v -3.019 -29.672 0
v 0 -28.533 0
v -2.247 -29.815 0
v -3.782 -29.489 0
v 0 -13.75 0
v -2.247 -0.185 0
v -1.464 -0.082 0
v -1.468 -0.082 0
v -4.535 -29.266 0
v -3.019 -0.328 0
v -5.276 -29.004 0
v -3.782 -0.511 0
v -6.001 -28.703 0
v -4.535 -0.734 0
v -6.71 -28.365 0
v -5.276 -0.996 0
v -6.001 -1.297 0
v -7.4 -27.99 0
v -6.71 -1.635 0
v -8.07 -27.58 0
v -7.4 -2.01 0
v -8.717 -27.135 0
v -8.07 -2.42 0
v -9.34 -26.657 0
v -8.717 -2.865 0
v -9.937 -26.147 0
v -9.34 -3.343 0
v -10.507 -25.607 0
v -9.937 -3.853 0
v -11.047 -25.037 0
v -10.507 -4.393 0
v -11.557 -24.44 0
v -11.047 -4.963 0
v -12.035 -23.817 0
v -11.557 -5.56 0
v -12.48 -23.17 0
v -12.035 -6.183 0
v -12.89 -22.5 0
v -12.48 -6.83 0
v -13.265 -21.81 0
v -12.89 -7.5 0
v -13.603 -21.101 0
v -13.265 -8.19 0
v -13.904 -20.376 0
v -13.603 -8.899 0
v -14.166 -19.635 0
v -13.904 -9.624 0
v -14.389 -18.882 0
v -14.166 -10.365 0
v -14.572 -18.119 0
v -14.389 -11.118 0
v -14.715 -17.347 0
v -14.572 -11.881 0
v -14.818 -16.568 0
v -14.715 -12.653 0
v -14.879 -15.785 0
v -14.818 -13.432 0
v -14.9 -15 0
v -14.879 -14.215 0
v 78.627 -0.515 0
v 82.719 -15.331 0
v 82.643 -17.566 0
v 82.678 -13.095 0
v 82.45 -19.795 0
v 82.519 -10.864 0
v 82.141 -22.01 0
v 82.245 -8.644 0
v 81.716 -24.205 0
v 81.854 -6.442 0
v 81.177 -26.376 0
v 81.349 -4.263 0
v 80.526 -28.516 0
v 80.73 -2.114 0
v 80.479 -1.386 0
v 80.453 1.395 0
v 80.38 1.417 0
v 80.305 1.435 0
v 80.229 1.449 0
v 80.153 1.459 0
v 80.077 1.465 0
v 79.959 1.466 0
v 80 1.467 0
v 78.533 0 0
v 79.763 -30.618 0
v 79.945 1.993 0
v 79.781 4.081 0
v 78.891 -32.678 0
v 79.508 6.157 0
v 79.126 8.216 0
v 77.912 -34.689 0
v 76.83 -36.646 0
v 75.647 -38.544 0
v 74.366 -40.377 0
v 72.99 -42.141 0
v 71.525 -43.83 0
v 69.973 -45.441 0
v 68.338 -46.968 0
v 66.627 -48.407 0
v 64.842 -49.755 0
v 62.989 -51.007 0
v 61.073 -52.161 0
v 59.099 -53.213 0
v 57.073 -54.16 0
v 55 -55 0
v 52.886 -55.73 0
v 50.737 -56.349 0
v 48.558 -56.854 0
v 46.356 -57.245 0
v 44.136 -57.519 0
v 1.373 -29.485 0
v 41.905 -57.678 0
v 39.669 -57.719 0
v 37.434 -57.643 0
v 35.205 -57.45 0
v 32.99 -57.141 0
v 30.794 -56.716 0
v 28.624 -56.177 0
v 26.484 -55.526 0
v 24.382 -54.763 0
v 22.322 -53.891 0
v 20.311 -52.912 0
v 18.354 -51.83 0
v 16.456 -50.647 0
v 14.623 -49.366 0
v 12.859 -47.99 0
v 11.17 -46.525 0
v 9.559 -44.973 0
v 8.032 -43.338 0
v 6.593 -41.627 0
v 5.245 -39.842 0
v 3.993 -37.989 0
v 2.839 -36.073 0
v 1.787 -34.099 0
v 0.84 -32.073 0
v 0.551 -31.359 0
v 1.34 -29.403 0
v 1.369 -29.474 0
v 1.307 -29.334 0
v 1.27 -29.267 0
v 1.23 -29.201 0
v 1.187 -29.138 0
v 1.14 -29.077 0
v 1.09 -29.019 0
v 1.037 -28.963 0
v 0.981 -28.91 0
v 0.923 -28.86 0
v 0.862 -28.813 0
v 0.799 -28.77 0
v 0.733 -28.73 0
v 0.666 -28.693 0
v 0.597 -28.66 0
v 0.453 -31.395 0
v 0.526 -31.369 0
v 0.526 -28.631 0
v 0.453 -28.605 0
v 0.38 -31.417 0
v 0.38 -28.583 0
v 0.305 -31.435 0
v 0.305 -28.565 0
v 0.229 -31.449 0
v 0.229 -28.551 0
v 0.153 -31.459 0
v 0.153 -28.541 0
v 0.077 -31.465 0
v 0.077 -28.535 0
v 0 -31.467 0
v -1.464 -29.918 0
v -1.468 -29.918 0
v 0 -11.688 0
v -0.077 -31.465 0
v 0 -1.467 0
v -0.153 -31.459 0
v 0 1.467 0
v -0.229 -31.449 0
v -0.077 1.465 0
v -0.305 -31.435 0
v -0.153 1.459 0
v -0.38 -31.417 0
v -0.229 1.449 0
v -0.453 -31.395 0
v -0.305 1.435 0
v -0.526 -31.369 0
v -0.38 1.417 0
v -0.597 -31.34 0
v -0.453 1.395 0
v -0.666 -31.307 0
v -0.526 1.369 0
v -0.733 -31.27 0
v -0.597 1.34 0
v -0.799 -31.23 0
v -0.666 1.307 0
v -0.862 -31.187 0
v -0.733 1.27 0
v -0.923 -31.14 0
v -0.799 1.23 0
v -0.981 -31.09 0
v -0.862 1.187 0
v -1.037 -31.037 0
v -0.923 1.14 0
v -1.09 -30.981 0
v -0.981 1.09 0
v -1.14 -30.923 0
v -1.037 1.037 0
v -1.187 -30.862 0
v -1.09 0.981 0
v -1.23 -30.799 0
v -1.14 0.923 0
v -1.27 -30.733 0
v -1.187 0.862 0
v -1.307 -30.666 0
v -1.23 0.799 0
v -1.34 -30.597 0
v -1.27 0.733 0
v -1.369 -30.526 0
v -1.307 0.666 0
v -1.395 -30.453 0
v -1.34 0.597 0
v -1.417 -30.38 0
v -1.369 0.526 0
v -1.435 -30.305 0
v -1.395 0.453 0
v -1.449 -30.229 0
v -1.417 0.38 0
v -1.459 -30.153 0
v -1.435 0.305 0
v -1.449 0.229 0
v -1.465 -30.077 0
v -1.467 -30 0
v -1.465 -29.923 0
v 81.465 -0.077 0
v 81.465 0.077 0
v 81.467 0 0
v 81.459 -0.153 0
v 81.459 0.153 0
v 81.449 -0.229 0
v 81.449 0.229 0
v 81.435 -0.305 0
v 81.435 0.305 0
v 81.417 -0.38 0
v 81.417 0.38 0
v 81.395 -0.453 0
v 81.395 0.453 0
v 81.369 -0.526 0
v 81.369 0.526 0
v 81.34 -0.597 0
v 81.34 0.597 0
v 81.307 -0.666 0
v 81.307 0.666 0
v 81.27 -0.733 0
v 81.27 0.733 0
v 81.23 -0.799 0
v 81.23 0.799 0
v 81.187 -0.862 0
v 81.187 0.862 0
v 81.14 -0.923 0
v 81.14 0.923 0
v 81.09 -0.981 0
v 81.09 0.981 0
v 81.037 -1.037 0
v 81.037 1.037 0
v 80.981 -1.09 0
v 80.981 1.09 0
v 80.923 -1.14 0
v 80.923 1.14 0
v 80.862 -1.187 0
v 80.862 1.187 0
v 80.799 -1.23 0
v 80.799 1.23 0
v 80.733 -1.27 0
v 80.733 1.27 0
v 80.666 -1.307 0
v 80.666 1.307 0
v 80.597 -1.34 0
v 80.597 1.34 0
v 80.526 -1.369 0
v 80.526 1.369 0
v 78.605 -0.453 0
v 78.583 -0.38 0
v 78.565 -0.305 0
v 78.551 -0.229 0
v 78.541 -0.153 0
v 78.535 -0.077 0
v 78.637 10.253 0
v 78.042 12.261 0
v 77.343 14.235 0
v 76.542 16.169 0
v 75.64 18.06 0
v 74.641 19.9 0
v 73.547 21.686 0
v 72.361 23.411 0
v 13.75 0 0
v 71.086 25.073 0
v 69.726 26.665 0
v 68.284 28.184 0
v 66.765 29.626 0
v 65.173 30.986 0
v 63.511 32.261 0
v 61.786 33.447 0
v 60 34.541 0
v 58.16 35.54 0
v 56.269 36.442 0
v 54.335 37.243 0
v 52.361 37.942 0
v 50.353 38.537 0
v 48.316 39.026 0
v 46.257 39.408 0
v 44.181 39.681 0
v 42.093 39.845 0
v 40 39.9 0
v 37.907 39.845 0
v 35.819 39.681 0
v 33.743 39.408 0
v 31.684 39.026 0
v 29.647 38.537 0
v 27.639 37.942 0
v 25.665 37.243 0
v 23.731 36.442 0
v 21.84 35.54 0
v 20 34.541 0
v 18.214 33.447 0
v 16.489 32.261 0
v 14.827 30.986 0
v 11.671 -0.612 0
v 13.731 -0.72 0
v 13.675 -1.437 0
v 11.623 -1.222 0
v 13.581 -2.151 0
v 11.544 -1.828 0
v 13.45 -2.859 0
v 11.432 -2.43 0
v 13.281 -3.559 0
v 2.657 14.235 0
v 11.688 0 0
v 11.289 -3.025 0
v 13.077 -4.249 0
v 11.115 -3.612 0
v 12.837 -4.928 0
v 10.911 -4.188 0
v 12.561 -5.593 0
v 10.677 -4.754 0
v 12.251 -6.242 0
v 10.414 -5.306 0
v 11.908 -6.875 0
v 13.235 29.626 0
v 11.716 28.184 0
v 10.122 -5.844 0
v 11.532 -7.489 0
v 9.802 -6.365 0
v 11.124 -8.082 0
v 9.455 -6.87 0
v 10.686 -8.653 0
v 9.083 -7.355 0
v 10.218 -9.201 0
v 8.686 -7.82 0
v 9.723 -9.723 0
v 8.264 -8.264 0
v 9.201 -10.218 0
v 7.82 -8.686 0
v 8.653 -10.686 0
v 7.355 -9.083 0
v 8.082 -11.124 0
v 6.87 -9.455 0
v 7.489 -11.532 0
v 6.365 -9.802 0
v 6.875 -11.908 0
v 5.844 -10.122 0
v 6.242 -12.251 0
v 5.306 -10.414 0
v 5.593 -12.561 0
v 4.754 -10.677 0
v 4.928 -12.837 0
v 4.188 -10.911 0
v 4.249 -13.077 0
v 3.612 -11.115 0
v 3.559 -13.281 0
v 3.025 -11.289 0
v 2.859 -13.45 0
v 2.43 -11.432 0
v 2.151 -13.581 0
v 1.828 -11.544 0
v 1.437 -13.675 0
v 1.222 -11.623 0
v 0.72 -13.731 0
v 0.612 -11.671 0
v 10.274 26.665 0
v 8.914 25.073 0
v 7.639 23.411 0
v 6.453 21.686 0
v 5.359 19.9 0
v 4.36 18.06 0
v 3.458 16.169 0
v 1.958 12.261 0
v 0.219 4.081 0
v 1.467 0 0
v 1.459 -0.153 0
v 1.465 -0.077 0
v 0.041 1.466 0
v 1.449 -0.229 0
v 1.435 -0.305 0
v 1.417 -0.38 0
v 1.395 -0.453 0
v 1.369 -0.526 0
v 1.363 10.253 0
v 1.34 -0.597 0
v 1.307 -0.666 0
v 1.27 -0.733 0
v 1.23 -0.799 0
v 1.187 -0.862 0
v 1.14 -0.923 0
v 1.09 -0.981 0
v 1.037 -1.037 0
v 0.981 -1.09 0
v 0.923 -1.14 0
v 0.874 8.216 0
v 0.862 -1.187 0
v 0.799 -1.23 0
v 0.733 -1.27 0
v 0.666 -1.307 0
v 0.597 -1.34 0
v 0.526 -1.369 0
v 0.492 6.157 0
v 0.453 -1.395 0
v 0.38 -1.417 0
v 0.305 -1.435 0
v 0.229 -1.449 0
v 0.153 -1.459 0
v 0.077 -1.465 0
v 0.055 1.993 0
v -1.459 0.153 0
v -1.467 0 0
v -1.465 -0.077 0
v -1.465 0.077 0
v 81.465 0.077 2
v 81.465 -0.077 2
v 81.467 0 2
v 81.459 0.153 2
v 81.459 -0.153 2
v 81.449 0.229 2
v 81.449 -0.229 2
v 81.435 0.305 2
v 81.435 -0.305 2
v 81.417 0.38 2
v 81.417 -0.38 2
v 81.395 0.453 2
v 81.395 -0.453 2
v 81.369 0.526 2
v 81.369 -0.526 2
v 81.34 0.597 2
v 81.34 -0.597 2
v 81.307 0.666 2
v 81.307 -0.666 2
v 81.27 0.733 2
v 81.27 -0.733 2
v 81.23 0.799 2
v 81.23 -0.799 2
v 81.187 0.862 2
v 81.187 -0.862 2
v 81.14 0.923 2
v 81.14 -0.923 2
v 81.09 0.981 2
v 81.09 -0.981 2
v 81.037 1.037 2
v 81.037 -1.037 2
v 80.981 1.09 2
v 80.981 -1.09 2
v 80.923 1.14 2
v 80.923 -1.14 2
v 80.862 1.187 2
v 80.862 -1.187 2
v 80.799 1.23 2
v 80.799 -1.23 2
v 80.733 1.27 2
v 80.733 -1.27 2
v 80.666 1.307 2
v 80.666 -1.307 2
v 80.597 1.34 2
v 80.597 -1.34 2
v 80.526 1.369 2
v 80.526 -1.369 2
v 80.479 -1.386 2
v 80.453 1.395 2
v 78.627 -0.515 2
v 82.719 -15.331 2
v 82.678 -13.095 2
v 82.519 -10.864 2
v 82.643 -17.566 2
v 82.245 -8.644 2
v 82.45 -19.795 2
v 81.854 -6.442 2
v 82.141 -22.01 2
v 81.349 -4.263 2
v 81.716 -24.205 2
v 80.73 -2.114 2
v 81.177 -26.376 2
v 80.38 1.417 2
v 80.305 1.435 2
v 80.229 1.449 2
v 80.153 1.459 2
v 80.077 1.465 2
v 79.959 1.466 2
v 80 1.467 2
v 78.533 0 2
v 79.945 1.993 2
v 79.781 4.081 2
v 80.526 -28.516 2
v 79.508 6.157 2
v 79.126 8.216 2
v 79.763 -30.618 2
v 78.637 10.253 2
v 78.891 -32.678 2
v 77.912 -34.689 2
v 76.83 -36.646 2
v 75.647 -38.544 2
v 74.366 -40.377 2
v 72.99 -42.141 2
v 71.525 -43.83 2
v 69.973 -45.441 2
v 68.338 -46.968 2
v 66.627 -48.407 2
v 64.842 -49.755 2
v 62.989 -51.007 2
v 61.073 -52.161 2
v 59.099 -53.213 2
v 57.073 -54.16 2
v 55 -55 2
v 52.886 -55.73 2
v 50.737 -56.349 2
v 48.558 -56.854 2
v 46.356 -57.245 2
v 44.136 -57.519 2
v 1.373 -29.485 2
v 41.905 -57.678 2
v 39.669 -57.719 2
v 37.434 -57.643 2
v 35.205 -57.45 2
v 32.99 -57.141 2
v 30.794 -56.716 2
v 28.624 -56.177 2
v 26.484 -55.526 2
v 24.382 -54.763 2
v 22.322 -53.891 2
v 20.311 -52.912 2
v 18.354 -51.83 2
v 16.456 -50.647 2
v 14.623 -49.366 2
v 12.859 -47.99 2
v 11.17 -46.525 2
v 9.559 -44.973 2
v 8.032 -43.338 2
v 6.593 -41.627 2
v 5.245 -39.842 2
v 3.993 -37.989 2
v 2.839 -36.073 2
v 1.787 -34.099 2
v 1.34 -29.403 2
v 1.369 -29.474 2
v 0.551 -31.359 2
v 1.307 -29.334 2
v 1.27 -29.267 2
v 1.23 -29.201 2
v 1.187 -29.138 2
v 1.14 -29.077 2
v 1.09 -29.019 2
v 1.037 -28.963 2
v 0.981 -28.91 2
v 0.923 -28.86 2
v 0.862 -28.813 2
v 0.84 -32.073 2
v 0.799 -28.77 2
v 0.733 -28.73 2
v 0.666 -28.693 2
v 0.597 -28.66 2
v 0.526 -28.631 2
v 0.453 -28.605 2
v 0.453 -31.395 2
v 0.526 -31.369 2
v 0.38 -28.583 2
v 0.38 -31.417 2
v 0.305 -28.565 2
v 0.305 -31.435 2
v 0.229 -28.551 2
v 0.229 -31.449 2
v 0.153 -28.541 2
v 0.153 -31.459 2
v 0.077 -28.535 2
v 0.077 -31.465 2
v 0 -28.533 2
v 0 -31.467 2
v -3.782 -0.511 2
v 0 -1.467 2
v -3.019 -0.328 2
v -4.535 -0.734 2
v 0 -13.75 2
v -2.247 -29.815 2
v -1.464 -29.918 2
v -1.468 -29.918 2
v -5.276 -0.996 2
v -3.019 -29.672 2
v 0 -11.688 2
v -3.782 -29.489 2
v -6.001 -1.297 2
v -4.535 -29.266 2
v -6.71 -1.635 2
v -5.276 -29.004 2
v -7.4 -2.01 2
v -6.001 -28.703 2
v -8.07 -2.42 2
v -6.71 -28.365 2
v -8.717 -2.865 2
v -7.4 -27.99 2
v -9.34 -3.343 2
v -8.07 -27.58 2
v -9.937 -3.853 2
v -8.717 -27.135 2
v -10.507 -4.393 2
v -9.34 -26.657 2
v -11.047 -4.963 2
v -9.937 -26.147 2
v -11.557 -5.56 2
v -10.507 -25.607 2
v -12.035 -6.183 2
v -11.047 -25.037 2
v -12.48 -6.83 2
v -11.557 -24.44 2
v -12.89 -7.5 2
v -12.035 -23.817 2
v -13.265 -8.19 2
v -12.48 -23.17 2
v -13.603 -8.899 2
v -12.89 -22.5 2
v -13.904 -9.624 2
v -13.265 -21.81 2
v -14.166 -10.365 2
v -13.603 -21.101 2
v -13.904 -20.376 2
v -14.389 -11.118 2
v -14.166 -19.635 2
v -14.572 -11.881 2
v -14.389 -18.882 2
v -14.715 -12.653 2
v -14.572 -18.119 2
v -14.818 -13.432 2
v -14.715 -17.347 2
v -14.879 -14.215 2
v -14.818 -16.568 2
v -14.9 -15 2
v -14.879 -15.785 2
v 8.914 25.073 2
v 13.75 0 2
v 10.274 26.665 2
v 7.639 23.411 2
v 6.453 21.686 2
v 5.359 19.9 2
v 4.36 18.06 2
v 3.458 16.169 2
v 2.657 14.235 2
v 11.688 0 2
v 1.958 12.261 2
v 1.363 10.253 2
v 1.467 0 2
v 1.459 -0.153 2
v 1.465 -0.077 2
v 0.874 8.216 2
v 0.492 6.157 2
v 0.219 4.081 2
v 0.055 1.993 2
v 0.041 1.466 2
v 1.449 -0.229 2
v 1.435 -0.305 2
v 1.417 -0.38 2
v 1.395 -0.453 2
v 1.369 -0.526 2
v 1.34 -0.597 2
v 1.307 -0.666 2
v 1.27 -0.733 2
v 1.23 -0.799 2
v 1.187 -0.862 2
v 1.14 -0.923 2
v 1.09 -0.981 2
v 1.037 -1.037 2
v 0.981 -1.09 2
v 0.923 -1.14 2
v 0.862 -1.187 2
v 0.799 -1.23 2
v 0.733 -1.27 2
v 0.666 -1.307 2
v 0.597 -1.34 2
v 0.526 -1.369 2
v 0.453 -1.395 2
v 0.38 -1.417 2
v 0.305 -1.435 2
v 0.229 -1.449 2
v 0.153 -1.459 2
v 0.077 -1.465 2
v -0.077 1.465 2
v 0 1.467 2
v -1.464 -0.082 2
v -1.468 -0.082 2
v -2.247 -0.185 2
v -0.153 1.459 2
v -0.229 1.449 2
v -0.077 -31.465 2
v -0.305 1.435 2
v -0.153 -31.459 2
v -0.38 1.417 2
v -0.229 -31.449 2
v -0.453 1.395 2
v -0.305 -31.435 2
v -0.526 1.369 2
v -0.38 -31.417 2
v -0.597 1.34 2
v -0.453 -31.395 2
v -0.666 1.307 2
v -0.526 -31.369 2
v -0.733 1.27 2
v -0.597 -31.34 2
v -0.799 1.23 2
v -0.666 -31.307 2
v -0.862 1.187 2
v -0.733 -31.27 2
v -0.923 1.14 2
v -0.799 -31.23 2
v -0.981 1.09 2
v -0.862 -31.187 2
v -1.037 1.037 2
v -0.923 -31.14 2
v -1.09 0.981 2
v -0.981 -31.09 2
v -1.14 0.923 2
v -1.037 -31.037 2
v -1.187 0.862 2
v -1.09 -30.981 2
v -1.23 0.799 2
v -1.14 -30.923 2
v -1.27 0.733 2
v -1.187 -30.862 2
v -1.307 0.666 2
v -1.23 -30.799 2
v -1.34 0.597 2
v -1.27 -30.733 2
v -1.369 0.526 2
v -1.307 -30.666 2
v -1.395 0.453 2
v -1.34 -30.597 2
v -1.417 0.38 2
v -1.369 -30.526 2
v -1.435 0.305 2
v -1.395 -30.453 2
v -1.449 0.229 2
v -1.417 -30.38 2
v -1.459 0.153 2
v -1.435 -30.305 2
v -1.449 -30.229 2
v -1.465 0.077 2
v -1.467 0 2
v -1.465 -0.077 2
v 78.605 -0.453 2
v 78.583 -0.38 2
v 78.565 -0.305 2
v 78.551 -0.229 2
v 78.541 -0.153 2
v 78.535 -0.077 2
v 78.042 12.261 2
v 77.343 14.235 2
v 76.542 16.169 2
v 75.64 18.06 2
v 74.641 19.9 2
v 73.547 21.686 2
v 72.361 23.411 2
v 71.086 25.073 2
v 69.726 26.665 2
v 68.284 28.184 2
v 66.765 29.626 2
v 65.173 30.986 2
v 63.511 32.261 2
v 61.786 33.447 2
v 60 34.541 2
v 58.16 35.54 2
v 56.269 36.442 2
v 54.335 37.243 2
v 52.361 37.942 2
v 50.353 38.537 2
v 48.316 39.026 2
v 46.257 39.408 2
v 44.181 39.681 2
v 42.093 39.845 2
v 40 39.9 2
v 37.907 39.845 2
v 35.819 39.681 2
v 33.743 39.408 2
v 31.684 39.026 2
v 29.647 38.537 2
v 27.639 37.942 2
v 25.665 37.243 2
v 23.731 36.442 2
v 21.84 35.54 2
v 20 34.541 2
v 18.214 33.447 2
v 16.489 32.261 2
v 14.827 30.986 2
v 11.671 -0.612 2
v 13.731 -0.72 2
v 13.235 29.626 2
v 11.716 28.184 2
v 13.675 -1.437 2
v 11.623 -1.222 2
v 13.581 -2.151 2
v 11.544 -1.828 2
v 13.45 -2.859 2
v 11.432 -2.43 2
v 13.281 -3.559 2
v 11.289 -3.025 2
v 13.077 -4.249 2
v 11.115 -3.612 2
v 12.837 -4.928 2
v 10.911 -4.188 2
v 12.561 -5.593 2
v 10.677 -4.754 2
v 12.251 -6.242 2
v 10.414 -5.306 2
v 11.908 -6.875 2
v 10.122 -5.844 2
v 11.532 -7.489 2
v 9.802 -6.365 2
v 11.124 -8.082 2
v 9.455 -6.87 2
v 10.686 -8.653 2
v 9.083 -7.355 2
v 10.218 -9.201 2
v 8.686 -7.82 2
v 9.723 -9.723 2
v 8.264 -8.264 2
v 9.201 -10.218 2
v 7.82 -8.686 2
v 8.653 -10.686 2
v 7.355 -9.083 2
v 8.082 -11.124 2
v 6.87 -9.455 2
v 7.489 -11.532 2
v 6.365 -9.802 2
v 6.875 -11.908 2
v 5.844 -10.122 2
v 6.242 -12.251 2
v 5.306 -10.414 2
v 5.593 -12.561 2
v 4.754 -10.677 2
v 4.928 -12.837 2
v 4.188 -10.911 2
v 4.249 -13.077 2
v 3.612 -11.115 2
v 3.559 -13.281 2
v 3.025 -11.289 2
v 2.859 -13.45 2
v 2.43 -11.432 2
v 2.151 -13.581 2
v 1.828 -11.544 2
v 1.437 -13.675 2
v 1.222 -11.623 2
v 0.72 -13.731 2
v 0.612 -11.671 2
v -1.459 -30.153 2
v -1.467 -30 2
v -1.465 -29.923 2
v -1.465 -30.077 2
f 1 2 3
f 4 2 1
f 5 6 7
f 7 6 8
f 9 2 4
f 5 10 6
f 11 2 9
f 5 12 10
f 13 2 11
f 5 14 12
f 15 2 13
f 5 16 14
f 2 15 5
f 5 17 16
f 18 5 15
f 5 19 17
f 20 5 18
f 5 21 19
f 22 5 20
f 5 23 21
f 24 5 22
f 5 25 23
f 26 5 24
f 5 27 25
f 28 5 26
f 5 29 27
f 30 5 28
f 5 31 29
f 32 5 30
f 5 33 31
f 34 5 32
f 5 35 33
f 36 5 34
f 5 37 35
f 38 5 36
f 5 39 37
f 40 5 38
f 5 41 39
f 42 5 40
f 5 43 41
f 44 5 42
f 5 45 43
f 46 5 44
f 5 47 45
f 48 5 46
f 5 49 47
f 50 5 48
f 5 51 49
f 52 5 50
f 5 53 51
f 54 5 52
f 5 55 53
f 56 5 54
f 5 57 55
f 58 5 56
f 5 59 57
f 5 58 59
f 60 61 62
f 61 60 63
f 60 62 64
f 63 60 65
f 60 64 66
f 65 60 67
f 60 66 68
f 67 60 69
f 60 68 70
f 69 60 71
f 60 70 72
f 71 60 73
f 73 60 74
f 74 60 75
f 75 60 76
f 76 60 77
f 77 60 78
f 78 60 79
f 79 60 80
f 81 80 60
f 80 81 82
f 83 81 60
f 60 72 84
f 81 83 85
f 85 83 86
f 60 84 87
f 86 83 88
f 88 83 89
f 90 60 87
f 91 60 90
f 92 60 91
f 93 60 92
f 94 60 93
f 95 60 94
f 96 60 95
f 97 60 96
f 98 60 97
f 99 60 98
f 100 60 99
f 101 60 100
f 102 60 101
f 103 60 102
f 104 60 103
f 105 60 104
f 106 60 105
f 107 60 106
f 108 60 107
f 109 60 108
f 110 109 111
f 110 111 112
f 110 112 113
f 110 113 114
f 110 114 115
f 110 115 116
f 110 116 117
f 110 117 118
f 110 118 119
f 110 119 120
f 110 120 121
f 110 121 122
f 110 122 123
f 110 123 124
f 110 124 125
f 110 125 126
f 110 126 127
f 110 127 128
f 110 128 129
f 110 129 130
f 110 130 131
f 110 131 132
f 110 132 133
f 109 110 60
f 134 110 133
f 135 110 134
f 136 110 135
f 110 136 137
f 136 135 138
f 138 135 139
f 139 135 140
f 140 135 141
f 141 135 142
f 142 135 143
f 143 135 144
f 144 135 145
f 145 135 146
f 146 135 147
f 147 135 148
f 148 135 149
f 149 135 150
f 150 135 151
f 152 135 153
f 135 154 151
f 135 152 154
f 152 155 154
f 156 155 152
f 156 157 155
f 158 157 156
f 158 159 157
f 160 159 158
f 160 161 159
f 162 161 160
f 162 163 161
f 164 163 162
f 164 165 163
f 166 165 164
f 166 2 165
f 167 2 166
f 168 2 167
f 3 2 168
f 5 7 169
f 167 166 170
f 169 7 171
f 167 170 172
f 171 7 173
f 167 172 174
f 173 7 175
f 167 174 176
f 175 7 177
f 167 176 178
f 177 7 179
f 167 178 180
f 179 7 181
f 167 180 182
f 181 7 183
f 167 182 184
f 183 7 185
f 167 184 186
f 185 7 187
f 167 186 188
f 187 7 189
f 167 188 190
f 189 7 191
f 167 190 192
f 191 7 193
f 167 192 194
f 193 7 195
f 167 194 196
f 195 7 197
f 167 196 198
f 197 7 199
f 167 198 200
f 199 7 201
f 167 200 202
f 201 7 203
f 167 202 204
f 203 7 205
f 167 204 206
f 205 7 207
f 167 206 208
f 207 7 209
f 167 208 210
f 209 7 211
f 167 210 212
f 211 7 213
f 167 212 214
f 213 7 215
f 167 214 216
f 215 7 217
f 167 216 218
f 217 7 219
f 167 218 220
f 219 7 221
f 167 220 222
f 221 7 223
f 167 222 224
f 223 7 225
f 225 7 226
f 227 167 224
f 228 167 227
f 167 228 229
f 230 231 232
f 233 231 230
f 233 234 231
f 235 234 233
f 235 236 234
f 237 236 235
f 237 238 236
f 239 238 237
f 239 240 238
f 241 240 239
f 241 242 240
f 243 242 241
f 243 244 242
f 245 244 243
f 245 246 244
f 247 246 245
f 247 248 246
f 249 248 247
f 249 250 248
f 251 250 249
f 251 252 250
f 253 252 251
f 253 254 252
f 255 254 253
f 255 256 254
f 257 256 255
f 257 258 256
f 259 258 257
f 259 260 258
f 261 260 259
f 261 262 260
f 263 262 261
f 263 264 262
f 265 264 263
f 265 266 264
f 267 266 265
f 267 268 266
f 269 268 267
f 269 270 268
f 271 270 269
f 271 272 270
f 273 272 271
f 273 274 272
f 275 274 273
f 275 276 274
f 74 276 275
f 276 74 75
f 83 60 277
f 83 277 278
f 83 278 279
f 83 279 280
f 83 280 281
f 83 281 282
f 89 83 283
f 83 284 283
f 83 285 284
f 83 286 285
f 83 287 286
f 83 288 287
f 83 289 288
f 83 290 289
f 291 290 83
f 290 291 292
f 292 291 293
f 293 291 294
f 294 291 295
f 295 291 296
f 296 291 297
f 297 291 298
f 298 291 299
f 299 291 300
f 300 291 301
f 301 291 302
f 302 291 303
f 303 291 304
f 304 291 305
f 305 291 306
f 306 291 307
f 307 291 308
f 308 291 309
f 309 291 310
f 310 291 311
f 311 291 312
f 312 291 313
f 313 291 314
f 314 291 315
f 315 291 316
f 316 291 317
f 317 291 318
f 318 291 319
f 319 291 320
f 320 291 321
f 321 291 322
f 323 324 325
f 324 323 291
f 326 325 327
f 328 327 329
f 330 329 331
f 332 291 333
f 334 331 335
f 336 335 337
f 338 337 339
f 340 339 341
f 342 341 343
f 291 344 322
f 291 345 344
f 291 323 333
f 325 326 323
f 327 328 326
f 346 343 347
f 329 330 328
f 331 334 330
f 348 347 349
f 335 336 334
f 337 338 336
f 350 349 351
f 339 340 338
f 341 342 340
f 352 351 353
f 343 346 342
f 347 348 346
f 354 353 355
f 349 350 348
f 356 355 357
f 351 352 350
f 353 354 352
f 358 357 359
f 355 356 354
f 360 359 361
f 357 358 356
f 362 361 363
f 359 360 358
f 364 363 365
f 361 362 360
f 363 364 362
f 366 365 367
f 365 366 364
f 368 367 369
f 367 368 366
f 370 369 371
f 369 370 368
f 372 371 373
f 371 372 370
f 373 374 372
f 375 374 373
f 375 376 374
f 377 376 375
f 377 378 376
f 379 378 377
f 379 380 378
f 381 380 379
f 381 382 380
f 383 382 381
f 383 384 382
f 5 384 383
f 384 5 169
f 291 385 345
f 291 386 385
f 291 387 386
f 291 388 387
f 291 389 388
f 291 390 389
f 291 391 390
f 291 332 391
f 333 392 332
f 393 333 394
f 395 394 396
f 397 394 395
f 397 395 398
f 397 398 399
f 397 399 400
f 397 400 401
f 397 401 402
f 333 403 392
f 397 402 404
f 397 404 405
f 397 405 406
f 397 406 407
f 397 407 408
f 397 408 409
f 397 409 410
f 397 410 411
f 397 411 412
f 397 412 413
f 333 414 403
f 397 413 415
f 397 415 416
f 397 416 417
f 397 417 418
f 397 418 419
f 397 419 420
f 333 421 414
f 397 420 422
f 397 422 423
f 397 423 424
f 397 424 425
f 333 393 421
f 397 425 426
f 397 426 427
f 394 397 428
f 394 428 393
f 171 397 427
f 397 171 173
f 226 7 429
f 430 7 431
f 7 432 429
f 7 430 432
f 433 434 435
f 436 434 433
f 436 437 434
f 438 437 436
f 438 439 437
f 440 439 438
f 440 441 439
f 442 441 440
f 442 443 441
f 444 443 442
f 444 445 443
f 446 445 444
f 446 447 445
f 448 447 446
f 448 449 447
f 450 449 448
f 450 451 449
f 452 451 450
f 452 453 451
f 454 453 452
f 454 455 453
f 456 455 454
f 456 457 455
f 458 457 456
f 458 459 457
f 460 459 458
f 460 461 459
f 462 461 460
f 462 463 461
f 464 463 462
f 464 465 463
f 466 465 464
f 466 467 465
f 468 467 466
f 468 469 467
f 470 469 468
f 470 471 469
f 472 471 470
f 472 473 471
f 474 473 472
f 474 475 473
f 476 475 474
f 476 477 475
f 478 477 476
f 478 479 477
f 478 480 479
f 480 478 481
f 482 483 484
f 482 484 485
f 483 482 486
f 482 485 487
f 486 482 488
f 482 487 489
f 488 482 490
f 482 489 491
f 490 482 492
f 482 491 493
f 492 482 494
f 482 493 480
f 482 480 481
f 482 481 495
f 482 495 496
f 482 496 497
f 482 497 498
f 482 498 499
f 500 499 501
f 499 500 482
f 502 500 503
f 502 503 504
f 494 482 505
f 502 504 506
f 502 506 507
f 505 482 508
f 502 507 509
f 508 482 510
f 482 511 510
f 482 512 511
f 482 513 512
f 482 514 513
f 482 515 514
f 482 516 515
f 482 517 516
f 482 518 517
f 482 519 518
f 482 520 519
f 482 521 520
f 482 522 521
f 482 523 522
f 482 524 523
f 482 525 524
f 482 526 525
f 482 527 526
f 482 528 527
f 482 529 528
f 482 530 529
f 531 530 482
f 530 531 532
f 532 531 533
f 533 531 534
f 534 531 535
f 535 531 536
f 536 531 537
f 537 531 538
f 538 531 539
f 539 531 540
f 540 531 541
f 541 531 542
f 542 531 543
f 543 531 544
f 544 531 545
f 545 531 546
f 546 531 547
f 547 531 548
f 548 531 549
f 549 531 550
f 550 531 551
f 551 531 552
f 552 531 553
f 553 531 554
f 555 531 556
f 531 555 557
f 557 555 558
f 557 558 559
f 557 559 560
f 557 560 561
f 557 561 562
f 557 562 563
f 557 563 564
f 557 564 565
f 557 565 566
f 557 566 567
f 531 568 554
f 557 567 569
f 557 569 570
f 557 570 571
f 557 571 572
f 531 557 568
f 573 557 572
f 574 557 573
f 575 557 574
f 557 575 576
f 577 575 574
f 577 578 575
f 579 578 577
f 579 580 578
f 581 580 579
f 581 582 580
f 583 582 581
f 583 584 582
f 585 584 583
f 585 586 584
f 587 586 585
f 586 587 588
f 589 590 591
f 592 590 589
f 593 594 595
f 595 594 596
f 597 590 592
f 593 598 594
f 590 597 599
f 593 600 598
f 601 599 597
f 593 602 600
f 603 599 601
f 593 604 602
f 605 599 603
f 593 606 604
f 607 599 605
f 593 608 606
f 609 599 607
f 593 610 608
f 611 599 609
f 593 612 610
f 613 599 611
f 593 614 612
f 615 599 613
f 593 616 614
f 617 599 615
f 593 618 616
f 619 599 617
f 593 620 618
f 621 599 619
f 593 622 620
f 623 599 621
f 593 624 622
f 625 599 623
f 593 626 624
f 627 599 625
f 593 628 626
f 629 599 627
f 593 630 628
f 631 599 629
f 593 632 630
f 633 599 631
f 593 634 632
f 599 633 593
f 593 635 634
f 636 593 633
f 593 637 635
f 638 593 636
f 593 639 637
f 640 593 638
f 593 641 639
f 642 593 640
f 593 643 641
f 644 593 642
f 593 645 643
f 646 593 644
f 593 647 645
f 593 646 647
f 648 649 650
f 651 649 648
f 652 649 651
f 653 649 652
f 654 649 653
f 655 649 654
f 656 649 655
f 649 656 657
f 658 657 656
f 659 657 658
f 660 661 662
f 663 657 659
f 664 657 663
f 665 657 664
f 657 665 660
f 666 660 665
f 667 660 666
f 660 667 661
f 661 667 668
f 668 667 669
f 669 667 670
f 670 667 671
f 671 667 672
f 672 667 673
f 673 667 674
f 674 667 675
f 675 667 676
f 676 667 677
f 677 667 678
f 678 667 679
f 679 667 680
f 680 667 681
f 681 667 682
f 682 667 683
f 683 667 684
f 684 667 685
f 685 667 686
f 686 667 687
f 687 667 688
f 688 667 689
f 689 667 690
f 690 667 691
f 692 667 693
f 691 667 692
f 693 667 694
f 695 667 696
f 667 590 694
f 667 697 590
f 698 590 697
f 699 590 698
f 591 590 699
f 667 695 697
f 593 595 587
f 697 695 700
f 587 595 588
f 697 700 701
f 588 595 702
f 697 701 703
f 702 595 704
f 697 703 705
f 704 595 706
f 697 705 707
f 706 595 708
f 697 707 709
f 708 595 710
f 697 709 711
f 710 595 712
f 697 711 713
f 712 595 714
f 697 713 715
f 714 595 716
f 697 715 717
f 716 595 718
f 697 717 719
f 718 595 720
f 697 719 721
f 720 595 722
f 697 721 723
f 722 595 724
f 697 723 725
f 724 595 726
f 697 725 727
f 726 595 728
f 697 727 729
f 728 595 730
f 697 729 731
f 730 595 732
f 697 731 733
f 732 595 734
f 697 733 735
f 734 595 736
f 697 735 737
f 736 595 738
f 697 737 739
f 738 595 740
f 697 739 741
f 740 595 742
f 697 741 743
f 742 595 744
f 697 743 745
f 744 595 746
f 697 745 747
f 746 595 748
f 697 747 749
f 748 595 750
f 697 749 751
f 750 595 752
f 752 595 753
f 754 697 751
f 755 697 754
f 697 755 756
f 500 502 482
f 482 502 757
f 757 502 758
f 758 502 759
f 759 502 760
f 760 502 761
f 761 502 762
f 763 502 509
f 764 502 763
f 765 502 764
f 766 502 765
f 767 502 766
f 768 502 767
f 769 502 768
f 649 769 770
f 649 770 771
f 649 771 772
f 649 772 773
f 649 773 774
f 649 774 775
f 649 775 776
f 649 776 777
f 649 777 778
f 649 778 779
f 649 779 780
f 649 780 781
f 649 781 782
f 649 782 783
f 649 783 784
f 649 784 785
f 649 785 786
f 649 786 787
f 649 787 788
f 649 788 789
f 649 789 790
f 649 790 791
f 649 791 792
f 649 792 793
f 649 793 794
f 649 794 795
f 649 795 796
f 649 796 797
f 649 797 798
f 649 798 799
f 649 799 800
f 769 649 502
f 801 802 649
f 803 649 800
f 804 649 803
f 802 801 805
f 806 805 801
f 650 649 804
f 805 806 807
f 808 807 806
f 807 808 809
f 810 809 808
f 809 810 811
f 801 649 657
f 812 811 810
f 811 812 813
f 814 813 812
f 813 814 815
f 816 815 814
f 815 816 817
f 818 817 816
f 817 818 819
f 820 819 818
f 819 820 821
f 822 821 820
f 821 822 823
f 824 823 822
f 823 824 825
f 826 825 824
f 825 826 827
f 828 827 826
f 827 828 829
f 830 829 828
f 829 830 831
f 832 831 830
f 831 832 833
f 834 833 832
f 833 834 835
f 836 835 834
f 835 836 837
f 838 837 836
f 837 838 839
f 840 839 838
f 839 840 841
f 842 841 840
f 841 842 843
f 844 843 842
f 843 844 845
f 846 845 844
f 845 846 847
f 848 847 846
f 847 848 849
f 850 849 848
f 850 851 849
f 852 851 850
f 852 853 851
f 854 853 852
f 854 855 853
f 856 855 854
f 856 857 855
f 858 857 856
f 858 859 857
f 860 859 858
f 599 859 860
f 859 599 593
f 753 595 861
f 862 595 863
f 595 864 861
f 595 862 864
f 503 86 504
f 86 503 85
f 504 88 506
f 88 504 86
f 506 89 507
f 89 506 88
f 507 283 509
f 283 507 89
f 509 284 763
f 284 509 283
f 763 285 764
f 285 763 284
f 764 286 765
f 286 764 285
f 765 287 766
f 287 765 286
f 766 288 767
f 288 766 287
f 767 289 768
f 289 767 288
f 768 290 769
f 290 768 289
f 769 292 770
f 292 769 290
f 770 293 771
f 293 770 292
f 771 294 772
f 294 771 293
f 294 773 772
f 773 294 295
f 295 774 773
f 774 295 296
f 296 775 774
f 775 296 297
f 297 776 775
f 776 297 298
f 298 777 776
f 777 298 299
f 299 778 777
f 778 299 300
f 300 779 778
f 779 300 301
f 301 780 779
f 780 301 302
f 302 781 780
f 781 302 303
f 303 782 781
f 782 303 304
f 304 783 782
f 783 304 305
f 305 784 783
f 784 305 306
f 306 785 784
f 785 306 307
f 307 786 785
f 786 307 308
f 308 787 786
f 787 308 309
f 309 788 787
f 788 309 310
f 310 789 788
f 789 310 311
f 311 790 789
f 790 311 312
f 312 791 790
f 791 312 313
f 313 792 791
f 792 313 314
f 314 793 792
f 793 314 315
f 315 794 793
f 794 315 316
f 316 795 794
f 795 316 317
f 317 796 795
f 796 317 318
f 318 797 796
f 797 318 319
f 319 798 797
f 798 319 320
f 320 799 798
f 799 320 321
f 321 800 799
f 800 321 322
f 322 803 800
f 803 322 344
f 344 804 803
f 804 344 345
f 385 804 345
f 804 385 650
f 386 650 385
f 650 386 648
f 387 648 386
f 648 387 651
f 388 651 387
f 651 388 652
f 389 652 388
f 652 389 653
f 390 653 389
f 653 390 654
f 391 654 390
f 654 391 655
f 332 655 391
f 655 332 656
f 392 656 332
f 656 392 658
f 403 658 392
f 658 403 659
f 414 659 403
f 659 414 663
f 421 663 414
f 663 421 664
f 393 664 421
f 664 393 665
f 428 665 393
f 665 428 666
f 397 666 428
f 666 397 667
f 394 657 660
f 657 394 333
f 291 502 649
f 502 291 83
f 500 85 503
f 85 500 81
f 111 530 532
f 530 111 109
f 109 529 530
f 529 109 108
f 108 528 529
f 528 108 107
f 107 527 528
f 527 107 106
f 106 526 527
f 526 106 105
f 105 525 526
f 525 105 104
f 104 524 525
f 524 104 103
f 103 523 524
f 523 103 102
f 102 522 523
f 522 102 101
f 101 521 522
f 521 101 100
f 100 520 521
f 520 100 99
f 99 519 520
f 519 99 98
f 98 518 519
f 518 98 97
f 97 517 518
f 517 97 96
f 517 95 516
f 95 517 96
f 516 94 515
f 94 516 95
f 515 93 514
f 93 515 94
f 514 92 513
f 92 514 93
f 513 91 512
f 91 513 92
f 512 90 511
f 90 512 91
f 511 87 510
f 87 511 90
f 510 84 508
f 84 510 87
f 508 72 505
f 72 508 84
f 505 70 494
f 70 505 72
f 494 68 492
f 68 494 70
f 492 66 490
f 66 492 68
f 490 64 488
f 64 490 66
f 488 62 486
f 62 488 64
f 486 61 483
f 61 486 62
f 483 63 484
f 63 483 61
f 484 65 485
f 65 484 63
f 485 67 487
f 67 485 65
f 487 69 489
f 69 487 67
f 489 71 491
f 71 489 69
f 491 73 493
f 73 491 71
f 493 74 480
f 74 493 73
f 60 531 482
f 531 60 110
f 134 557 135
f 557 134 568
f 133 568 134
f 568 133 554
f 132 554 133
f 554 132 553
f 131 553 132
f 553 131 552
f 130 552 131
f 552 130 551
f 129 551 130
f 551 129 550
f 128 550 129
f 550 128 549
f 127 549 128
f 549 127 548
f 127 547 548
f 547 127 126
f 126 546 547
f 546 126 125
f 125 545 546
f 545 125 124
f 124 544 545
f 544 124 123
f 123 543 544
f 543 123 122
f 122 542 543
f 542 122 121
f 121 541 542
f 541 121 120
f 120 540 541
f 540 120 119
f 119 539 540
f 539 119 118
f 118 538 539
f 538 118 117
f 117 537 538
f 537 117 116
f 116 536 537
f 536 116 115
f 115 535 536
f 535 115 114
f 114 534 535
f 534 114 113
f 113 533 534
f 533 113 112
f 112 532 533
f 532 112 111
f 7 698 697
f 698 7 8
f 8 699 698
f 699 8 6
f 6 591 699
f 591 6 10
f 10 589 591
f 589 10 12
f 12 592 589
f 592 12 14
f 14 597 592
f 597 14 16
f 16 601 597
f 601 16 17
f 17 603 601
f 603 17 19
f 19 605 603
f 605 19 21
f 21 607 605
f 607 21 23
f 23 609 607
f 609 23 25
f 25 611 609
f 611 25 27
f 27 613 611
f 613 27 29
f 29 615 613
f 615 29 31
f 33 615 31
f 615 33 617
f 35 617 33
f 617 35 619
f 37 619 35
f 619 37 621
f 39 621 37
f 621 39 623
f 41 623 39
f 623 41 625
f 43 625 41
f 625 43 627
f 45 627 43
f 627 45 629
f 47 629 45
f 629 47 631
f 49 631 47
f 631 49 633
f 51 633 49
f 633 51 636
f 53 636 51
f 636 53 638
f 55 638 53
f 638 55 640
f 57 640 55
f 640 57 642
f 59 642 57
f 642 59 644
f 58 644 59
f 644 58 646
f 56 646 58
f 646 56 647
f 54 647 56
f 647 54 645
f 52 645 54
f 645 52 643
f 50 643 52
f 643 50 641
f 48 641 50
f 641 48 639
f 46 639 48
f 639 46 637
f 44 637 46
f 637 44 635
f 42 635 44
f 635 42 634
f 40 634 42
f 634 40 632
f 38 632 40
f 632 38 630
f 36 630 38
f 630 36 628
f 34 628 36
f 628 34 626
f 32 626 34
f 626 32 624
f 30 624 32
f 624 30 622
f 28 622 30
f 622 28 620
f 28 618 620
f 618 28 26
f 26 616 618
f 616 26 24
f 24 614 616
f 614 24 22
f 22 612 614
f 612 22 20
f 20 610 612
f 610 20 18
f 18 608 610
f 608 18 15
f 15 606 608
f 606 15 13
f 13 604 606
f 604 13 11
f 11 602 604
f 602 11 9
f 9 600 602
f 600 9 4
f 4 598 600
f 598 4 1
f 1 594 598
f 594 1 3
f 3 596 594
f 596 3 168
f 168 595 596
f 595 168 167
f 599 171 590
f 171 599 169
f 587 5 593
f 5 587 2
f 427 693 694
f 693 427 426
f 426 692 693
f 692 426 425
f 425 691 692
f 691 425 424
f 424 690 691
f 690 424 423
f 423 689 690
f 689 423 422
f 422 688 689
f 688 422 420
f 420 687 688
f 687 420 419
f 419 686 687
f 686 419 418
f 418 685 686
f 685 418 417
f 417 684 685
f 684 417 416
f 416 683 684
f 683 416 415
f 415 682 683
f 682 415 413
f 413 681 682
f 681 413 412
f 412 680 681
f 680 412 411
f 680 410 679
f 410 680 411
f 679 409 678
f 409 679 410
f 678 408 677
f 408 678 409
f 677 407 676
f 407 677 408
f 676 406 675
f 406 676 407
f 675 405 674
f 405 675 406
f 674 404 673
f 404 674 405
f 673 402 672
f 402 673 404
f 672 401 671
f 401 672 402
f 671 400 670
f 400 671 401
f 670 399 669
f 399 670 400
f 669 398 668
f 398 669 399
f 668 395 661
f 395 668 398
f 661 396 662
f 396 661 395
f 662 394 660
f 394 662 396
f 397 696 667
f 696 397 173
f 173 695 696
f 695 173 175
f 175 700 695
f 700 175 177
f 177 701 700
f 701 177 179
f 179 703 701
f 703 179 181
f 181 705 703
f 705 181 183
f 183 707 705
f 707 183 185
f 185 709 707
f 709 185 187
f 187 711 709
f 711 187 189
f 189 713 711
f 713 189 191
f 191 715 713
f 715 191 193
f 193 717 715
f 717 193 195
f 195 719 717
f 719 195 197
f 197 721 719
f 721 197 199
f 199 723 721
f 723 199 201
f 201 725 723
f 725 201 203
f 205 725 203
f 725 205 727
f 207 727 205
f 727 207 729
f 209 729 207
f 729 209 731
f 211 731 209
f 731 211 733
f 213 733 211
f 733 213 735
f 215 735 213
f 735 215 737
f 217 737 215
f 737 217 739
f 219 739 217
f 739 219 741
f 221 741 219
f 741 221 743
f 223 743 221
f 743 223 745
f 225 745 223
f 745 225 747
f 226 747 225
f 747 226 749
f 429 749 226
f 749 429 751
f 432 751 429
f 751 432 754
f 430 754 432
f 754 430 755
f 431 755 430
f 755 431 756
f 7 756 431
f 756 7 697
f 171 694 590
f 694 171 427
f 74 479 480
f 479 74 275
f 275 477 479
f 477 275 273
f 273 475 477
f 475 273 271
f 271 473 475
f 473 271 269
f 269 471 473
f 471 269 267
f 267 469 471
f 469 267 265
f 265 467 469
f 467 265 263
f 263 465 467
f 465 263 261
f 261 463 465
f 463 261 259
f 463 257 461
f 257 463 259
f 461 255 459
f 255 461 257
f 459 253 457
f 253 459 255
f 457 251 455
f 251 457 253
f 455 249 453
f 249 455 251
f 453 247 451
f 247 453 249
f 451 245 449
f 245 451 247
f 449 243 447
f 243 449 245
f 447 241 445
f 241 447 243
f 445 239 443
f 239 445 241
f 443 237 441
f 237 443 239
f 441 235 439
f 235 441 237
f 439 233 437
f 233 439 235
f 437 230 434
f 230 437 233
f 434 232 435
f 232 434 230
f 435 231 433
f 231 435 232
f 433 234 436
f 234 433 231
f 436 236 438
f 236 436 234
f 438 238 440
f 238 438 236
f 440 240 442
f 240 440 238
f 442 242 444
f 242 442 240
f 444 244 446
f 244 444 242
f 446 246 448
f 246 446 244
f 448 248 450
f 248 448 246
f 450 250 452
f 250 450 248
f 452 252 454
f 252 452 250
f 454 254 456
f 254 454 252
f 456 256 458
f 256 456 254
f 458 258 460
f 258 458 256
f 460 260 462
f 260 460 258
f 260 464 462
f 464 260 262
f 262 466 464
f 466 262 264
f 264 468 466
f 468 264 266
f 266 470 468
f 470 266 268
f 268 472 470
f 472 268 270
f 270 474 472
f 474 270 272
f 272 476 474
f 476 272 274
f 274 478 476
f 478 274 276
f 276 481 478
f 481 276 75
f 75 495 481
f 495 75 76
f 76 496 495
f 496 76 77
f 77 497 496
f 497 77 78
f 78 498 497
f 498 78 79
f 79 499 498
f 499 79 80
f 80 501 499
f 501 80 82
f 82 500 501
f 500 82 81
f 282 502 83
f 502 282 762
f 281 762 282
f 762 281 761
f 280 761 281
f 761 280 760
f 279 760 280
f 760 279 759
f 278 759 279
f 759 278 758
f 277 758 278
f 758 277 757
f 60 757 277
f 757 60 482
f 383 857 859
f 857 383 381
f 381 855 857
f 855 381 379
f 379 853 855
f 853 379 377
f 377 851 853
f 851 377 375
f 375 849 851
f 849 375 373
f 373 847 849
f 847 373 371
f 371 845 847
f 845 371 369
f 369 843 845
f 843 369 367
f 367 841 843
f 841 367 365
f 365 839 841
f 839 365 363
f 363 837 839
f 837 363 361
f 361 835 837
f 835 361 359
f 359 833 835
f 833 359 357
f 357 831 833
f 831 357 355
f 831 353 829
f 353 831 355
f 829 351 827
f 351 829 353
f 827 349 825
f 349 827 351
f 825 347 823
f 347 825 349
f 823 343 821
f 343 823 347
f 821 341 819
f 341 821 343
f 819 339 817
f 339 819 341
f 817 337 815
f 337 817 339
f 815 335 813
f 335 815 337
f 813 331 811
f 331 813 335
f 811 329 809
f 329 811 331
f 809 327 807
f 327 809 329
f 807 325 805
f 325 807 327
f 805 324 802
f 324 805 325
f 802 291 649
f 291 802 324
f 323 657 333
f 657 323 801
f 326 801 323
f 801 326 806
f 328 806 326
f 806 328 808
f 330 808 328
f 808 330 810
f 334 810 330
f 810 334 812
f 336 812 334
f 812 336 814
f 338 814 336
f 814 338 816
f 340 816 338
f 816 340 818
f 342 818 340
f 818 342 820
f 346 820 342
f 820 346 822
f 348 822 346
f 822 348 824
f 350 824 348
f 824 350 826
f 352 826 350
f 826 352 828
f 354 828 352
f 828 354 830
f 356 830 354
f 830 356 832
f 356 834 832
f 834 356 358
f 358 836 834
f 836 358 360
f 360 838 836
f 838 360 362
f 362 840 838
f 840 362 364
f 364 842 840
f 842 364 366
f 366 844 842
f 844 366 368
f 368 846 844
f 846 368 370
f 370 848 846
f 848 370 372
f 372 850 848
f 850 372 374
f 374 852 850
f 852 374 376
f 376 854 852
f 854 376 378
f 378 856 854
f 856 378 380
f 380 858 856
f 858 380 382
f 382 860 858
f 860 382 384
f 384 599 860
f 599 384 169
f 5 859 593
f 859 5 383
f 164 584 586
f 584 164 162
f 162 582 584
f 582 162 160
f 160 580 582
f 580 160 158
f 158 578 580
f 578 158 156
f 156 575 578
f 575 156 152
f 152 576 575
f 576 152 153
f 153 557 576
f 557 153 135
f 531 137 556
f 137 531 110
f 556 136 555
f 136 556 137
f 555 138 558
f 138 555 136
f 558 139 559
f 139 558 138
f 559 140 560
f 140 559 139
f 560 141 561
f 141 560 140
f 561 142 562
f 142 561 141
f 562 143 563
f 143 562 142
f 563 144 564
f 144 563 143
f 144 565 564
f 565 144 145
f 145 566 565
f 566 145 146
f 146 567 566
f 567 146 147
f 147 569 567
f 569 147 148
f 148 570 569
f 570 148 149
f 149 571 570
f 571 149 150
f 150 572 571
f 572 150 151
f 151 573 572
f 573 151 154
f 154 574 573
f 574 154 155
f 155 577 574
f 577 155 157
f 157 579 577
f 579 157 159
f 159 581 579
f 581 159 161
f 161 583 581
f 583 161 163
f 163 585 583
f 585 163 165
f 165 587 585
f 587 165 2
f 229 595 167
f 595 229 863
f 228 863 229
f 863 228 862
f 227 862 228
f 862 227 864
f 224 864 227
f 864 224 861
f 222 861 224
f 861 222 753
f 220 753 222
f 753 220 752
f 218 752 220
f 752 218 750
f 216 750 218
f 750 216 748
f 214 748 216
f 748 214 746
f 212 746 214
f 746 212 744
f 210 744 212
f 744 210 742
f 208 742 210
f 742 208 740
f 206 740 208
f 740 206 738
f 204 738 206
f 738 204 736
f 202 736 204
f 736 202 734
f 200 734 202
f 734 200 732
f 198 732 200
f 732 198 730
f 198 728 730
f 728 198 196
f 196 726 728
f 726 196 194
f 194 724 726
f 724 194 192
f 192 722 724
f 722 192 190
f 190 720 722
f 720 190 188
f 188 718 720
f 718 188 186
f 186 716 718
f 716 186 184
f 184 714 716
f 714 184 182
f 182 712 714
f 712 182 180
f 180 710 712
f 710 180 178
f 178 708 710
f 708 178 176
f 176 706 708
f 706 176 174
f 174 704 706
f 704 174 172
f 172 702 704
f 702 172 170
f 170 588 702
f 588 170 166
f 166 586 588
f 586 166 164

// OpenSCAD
// [FL_INDEX: keywords="openscad, 3d_parametric, Pythagoras_and_the_3D-Printing_Age, csg_solid" | COT="Parametric OpenSCAD design from 3DCodeverse"]
// Title: Pythagoras and the 3D-Printing Age

// Pythagoras Thing
// Version 1.0
// Luigi Cisana, 22 Jan, 2014

// Leg a
leg_a=80; // [20:120]
// Leq b
leg_b=30; // [20:120]
// Height
heigth = 2; // [1:120]

// Number of facets, set a low value for a draft version
fn = 120; // [30:200]

/* [Hidden] */
a = leg_a;
b = leg_b;
c = sqrt(pow(a,2)+pow(b,2));
h = heigth;
ro = (a+b)/8;
e = (a+b)/75;

echo("c =", c, "ro =", ro, "e =", e);

/****** Main *********/
linear_extrude(height=h , center = false, convexity = 10, twist = 0) {
	semi_circles_a();
	semi_circles_b();
	semi_circles_c();
}

triangle();

//translate ([-3,3]) cylinder(h = 5.5, r=1, $fn=fn);

/****** Modules *********/

module semi_circles_a () {
	difference () {
		translate ([a/2,-0.1]) circle(r = a/2,$fn=fn);
		translate ([0,-a]) square ([a,a], center=false);
	}
} 

module semi_circles_b () {
	difference () {
		translate ([0.1,-b/2]) circle(r = b/2,$fn=fn);
		translate ([0,-b]) square ([b,b], center=false);
	}
}

module semi_circles_c () {
	translate ([0,-b]) {
		rotate(a=[0,0,asin(b/c)]) {
			difference () {
				translate ([c/2,0]) circle(r = c/2,$fn=fn);
				translate ([0,0]) square ([c,c], center=false);
			}
		}
	}
}

module triangle() {
	linear_extrude(height=h , center = false, convexity = 10, twist = 0) {
		difference () {
			circle(r = ro, $fn=fn);
			circle(r = ro*0.85, $fn=fn);
			translate ([-ro,0]) square ([2*ro,ro], center=false);
			translate ([-ro,-2*ro]) square ([ro,2*ro], center=false);	
		}
		
		translate ([0,0]) circle( r = e, $fn=fn);
		translate ([a,0]) circle( r = e, $fn=fn);
		translate ([0,-b]) circle( r = e, $fn=fn);
	}
}
